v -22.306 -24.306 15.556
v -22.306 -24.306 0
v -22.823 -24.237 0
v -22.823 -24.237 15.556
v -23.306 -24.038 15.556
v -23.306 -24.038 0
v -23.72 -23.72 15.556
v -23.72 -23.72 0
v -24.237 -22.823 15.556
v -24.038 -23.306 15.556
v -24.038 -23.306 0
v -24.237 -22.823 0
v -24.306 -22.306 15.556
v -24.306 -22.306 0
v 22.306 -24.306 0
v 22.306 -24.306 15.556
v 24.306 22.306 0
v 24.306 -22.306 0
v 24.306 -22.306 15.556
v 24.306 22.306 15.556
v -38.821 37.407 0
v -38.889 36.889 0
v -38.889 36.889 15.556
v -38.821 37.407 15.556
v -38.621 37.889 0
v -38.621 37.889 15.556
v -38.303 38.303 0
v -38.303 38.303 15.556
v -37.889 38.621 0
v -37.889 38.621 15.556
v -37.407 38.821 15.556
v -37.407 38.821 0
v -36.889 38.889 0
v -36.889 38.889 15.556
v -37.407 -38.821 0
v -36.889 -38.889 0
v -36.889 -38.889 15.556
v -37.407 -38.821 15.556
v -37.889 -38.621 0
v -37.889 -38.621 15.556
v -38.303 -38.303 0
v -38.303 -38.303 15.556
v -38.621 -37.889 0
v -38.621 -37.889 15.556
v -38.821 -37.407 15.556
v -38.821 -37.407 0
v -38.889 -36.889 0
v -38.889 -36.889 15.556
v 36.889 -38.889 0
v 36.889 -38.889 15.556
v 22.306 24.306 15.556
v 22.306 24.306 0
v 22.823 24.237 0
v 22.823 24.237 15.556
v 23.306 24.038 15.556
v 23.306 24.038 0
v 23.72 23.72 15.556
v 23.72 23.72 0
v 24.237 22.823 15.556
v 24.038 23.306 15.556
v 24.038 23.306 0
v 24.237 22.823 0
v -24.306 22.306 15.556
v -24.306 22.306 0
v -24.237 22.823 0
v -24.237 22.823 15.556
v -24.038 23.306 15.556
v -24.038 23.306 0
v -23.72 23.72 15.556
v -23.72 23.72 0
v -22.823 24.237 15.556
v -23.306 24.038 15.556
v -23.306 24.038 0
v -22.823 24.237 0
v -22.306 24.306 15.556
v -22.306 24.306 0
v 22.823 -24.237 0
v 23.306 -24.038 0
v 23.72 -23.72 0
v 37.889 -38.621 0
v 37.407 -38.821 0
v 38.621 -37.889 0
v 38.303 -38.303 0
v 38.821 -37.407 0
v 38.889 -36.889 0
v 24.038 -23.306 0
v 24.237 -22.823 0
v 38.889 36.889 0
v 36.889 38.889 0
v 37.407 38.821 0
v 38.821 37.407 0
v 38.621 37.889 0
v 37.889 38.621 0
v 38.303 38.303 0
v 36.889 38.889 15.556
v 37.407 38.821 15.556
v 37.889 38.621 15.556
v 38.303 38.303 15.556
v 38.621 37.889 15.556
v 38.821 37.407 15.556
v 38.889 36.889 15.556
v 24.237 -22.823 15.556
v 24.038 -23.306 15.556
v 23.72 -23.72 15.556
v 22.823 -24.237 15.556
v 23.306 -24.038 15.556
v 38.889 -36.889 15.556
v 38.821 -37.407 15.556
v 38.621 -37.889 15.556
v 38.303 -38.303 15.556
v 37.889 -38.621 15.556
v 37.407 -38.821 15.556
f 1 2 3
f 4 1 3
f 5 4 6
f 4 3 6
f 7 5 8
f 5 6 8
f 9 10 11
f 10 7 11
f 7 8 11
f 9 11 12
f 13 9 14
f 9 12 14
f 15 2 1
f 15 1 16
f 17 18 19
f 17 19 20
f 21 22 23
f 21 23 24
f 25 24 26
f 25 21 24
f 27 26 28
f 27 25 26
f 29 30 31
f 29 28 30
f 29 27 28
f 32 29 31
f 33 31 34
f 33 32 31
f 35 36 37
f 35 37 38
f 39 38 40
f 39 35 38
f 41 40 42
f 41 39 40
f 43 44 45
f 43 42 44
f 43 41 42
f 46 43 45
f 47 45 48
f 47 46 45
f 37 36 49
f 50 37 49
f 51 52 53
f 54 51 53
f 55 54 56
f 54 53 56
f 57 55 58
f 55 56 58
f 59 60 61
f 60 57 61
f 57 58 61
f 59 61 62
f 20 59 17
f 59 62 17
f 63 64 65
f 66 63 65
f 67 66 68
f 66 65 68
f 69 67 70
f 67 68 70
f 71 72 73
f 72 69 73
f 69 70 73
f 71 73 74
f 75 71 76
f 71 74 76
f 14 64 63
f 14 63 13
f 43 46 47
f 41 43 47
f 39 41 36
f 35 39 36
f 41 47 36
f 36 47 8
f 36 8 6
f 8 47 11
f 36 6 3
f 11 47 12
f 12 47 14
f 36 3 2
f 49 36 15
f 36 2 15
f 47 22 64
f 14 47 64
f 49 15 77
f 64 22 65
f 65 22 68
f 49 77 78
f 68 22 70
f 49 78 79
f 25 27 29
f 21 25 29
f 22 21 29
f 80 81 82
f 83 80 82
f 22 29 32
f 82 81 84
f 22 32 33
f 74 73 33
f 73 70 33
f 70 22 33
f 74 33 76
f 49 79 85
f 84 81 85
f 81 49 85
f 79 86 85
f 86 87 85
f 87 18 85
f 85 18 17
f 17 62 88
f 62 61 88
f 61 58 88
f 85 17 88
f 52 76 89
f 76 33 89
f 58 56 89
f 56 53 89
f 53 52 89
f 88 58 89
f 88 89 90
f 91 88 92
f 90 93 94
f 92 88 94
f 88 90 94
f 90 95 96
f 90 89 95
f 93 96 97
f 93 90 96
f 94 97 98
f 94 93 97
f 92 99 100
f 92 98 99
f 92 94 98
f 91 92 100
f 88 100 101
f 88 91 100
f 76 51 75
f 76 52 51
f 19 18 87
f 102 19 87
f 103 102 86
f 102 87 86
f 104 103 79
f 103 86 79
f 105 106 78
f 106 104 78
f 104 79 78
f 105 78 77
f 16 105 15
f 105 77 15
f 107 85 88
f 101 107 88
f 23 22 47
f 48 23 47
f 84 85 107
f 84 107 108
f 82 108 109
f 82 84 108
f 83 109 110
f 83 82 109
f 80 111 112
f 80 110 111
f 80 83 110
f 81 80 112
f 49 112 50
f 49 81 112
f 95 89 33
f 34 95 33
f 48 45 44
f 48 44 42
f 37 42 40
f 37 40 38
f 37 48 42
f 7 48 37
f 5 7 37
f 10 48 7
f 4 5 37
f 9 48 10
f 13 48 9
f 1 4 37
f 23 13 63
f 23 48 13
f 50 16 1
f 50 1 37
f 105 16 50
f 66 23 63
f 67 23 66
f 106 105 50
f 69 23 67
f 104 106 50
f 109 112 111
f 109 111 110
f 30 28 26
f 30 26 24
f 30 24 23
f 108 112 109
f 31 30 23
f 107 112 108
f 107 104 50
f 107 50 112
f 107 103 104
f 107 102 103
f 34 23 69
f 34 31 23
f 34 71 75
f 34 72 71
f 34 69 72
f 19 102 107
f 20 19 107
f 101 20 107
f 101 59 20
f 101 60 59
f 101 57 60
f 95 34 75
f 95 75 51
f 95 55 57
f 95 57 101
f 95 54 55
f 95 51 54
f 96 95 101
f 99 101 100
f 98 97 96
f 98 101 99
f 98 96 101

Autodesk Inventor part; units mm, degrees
ref_plane "YZ Plane" through (0, 0, 0) normal (1, 0, 0) x (0, 1, 0)
ref_plane "XZ Plane" through (0, 0, 0) normal (0, 1, 0) x (-1, 0, 0)
ref_plane "XY Plane" through (0, 0, 0) normal (0, 0, 1) x (1, 0, 0)
sketch "Sketch1" plane through (0, 0, 0) normal (0, 0, 1) x (1, 0, 0)
  point P0 (0, 0)
sketch "Sketch2" plane through (0, 0, 0) normal (0, 0, 1) x (1, 0, 0)
  line L0 (-22.3056, -24.3056) -> (22.3056, -24.3056)
  line L1 (24.3056, -22.3056) -> (24.3056, 22.3056)
  line L2 (22.3056, 24.3056) -> (-22.3056, 24.3056)
  line L3 (-24.3056, 22.3056) -> (-24.3056, -22.3056)
  line L4 (-24.3056, -24.3056) -> (24.3056, 24.3056) construction
  line L5 (24.3056, -24.3056) -> (-24.3056, 24.3056) construction
  line L6 (-36.8889, -38.8889) -> (36.8889, -38.8889)
  line L7 (38.8889, -36.8889) -> (38.8889, 36.8889)
  line L8 (36.8889, 38.8889) -> (-36.8889, 38.8889)
  line L9 (-38.8889, 36.8889) -> (-38.8889, -36.8889)
  line L10 (-38.8889, -38.8889) -> (38.8889, 38.8889) construction
  line L11 (38.8889, -38.8889) -> (-38.8889, 38.8889) construction
  arc A0 (-36.8889, 38.8889) -> (-38.8889, 36.8889) centre (-36.8889, 36.8889) ccw
  arc A1 (38.8889, 36.8889) -> (36.8889, 38.8889) centre (36.8889, 36.8889) ccw
  arc A2 (36.8889, -38.8889) -> (38.8889, -36.8889) centre (36.8889, -36.8889) ccw
  arc A3 (-38.8889, -36.8889) -> (-36.8889, -38.8889) centre (-36.8889, -36.8889) ccw
  arc A4 (-24.3056, -22.3056) -> (-22.3056, -24.3056) centre (-22.3056, -22.3056) ccw
  arc A5 (22.3056, -24.3056) -> (24.3056, -22.3056) centre (22.3056, -22.3056) ccw
  arc A6 (24.3056, 22.3056) -> (22.3056, 24.3056) centre (22.3056, 22.3056) ccw
  arc A7 (-22.3056, 24.3056) -> (-24.3056, 22.3056) centre (-22.3056, 22.3056) ccw
  point P0 (0, 0)
  dimension "HL" = 48.6111
  dimension "d1" = 24.3056
  dimension "d2" = 77.7778
  dimension "d3" = 38.8889
  dimension "d4" = 2
extrude "Extrusion1" add sketch "Sketch2" along normal blind 15.5556
equation "\"d1\" = 0.5 * HL"
equation "\"d2\" = 1.6 * HL"
equation "\"d3\" = 0.8 * HL"
equation "\"d5\" = 0.32 * HL"
properties part number "Ram(Nästankvadratisk"
